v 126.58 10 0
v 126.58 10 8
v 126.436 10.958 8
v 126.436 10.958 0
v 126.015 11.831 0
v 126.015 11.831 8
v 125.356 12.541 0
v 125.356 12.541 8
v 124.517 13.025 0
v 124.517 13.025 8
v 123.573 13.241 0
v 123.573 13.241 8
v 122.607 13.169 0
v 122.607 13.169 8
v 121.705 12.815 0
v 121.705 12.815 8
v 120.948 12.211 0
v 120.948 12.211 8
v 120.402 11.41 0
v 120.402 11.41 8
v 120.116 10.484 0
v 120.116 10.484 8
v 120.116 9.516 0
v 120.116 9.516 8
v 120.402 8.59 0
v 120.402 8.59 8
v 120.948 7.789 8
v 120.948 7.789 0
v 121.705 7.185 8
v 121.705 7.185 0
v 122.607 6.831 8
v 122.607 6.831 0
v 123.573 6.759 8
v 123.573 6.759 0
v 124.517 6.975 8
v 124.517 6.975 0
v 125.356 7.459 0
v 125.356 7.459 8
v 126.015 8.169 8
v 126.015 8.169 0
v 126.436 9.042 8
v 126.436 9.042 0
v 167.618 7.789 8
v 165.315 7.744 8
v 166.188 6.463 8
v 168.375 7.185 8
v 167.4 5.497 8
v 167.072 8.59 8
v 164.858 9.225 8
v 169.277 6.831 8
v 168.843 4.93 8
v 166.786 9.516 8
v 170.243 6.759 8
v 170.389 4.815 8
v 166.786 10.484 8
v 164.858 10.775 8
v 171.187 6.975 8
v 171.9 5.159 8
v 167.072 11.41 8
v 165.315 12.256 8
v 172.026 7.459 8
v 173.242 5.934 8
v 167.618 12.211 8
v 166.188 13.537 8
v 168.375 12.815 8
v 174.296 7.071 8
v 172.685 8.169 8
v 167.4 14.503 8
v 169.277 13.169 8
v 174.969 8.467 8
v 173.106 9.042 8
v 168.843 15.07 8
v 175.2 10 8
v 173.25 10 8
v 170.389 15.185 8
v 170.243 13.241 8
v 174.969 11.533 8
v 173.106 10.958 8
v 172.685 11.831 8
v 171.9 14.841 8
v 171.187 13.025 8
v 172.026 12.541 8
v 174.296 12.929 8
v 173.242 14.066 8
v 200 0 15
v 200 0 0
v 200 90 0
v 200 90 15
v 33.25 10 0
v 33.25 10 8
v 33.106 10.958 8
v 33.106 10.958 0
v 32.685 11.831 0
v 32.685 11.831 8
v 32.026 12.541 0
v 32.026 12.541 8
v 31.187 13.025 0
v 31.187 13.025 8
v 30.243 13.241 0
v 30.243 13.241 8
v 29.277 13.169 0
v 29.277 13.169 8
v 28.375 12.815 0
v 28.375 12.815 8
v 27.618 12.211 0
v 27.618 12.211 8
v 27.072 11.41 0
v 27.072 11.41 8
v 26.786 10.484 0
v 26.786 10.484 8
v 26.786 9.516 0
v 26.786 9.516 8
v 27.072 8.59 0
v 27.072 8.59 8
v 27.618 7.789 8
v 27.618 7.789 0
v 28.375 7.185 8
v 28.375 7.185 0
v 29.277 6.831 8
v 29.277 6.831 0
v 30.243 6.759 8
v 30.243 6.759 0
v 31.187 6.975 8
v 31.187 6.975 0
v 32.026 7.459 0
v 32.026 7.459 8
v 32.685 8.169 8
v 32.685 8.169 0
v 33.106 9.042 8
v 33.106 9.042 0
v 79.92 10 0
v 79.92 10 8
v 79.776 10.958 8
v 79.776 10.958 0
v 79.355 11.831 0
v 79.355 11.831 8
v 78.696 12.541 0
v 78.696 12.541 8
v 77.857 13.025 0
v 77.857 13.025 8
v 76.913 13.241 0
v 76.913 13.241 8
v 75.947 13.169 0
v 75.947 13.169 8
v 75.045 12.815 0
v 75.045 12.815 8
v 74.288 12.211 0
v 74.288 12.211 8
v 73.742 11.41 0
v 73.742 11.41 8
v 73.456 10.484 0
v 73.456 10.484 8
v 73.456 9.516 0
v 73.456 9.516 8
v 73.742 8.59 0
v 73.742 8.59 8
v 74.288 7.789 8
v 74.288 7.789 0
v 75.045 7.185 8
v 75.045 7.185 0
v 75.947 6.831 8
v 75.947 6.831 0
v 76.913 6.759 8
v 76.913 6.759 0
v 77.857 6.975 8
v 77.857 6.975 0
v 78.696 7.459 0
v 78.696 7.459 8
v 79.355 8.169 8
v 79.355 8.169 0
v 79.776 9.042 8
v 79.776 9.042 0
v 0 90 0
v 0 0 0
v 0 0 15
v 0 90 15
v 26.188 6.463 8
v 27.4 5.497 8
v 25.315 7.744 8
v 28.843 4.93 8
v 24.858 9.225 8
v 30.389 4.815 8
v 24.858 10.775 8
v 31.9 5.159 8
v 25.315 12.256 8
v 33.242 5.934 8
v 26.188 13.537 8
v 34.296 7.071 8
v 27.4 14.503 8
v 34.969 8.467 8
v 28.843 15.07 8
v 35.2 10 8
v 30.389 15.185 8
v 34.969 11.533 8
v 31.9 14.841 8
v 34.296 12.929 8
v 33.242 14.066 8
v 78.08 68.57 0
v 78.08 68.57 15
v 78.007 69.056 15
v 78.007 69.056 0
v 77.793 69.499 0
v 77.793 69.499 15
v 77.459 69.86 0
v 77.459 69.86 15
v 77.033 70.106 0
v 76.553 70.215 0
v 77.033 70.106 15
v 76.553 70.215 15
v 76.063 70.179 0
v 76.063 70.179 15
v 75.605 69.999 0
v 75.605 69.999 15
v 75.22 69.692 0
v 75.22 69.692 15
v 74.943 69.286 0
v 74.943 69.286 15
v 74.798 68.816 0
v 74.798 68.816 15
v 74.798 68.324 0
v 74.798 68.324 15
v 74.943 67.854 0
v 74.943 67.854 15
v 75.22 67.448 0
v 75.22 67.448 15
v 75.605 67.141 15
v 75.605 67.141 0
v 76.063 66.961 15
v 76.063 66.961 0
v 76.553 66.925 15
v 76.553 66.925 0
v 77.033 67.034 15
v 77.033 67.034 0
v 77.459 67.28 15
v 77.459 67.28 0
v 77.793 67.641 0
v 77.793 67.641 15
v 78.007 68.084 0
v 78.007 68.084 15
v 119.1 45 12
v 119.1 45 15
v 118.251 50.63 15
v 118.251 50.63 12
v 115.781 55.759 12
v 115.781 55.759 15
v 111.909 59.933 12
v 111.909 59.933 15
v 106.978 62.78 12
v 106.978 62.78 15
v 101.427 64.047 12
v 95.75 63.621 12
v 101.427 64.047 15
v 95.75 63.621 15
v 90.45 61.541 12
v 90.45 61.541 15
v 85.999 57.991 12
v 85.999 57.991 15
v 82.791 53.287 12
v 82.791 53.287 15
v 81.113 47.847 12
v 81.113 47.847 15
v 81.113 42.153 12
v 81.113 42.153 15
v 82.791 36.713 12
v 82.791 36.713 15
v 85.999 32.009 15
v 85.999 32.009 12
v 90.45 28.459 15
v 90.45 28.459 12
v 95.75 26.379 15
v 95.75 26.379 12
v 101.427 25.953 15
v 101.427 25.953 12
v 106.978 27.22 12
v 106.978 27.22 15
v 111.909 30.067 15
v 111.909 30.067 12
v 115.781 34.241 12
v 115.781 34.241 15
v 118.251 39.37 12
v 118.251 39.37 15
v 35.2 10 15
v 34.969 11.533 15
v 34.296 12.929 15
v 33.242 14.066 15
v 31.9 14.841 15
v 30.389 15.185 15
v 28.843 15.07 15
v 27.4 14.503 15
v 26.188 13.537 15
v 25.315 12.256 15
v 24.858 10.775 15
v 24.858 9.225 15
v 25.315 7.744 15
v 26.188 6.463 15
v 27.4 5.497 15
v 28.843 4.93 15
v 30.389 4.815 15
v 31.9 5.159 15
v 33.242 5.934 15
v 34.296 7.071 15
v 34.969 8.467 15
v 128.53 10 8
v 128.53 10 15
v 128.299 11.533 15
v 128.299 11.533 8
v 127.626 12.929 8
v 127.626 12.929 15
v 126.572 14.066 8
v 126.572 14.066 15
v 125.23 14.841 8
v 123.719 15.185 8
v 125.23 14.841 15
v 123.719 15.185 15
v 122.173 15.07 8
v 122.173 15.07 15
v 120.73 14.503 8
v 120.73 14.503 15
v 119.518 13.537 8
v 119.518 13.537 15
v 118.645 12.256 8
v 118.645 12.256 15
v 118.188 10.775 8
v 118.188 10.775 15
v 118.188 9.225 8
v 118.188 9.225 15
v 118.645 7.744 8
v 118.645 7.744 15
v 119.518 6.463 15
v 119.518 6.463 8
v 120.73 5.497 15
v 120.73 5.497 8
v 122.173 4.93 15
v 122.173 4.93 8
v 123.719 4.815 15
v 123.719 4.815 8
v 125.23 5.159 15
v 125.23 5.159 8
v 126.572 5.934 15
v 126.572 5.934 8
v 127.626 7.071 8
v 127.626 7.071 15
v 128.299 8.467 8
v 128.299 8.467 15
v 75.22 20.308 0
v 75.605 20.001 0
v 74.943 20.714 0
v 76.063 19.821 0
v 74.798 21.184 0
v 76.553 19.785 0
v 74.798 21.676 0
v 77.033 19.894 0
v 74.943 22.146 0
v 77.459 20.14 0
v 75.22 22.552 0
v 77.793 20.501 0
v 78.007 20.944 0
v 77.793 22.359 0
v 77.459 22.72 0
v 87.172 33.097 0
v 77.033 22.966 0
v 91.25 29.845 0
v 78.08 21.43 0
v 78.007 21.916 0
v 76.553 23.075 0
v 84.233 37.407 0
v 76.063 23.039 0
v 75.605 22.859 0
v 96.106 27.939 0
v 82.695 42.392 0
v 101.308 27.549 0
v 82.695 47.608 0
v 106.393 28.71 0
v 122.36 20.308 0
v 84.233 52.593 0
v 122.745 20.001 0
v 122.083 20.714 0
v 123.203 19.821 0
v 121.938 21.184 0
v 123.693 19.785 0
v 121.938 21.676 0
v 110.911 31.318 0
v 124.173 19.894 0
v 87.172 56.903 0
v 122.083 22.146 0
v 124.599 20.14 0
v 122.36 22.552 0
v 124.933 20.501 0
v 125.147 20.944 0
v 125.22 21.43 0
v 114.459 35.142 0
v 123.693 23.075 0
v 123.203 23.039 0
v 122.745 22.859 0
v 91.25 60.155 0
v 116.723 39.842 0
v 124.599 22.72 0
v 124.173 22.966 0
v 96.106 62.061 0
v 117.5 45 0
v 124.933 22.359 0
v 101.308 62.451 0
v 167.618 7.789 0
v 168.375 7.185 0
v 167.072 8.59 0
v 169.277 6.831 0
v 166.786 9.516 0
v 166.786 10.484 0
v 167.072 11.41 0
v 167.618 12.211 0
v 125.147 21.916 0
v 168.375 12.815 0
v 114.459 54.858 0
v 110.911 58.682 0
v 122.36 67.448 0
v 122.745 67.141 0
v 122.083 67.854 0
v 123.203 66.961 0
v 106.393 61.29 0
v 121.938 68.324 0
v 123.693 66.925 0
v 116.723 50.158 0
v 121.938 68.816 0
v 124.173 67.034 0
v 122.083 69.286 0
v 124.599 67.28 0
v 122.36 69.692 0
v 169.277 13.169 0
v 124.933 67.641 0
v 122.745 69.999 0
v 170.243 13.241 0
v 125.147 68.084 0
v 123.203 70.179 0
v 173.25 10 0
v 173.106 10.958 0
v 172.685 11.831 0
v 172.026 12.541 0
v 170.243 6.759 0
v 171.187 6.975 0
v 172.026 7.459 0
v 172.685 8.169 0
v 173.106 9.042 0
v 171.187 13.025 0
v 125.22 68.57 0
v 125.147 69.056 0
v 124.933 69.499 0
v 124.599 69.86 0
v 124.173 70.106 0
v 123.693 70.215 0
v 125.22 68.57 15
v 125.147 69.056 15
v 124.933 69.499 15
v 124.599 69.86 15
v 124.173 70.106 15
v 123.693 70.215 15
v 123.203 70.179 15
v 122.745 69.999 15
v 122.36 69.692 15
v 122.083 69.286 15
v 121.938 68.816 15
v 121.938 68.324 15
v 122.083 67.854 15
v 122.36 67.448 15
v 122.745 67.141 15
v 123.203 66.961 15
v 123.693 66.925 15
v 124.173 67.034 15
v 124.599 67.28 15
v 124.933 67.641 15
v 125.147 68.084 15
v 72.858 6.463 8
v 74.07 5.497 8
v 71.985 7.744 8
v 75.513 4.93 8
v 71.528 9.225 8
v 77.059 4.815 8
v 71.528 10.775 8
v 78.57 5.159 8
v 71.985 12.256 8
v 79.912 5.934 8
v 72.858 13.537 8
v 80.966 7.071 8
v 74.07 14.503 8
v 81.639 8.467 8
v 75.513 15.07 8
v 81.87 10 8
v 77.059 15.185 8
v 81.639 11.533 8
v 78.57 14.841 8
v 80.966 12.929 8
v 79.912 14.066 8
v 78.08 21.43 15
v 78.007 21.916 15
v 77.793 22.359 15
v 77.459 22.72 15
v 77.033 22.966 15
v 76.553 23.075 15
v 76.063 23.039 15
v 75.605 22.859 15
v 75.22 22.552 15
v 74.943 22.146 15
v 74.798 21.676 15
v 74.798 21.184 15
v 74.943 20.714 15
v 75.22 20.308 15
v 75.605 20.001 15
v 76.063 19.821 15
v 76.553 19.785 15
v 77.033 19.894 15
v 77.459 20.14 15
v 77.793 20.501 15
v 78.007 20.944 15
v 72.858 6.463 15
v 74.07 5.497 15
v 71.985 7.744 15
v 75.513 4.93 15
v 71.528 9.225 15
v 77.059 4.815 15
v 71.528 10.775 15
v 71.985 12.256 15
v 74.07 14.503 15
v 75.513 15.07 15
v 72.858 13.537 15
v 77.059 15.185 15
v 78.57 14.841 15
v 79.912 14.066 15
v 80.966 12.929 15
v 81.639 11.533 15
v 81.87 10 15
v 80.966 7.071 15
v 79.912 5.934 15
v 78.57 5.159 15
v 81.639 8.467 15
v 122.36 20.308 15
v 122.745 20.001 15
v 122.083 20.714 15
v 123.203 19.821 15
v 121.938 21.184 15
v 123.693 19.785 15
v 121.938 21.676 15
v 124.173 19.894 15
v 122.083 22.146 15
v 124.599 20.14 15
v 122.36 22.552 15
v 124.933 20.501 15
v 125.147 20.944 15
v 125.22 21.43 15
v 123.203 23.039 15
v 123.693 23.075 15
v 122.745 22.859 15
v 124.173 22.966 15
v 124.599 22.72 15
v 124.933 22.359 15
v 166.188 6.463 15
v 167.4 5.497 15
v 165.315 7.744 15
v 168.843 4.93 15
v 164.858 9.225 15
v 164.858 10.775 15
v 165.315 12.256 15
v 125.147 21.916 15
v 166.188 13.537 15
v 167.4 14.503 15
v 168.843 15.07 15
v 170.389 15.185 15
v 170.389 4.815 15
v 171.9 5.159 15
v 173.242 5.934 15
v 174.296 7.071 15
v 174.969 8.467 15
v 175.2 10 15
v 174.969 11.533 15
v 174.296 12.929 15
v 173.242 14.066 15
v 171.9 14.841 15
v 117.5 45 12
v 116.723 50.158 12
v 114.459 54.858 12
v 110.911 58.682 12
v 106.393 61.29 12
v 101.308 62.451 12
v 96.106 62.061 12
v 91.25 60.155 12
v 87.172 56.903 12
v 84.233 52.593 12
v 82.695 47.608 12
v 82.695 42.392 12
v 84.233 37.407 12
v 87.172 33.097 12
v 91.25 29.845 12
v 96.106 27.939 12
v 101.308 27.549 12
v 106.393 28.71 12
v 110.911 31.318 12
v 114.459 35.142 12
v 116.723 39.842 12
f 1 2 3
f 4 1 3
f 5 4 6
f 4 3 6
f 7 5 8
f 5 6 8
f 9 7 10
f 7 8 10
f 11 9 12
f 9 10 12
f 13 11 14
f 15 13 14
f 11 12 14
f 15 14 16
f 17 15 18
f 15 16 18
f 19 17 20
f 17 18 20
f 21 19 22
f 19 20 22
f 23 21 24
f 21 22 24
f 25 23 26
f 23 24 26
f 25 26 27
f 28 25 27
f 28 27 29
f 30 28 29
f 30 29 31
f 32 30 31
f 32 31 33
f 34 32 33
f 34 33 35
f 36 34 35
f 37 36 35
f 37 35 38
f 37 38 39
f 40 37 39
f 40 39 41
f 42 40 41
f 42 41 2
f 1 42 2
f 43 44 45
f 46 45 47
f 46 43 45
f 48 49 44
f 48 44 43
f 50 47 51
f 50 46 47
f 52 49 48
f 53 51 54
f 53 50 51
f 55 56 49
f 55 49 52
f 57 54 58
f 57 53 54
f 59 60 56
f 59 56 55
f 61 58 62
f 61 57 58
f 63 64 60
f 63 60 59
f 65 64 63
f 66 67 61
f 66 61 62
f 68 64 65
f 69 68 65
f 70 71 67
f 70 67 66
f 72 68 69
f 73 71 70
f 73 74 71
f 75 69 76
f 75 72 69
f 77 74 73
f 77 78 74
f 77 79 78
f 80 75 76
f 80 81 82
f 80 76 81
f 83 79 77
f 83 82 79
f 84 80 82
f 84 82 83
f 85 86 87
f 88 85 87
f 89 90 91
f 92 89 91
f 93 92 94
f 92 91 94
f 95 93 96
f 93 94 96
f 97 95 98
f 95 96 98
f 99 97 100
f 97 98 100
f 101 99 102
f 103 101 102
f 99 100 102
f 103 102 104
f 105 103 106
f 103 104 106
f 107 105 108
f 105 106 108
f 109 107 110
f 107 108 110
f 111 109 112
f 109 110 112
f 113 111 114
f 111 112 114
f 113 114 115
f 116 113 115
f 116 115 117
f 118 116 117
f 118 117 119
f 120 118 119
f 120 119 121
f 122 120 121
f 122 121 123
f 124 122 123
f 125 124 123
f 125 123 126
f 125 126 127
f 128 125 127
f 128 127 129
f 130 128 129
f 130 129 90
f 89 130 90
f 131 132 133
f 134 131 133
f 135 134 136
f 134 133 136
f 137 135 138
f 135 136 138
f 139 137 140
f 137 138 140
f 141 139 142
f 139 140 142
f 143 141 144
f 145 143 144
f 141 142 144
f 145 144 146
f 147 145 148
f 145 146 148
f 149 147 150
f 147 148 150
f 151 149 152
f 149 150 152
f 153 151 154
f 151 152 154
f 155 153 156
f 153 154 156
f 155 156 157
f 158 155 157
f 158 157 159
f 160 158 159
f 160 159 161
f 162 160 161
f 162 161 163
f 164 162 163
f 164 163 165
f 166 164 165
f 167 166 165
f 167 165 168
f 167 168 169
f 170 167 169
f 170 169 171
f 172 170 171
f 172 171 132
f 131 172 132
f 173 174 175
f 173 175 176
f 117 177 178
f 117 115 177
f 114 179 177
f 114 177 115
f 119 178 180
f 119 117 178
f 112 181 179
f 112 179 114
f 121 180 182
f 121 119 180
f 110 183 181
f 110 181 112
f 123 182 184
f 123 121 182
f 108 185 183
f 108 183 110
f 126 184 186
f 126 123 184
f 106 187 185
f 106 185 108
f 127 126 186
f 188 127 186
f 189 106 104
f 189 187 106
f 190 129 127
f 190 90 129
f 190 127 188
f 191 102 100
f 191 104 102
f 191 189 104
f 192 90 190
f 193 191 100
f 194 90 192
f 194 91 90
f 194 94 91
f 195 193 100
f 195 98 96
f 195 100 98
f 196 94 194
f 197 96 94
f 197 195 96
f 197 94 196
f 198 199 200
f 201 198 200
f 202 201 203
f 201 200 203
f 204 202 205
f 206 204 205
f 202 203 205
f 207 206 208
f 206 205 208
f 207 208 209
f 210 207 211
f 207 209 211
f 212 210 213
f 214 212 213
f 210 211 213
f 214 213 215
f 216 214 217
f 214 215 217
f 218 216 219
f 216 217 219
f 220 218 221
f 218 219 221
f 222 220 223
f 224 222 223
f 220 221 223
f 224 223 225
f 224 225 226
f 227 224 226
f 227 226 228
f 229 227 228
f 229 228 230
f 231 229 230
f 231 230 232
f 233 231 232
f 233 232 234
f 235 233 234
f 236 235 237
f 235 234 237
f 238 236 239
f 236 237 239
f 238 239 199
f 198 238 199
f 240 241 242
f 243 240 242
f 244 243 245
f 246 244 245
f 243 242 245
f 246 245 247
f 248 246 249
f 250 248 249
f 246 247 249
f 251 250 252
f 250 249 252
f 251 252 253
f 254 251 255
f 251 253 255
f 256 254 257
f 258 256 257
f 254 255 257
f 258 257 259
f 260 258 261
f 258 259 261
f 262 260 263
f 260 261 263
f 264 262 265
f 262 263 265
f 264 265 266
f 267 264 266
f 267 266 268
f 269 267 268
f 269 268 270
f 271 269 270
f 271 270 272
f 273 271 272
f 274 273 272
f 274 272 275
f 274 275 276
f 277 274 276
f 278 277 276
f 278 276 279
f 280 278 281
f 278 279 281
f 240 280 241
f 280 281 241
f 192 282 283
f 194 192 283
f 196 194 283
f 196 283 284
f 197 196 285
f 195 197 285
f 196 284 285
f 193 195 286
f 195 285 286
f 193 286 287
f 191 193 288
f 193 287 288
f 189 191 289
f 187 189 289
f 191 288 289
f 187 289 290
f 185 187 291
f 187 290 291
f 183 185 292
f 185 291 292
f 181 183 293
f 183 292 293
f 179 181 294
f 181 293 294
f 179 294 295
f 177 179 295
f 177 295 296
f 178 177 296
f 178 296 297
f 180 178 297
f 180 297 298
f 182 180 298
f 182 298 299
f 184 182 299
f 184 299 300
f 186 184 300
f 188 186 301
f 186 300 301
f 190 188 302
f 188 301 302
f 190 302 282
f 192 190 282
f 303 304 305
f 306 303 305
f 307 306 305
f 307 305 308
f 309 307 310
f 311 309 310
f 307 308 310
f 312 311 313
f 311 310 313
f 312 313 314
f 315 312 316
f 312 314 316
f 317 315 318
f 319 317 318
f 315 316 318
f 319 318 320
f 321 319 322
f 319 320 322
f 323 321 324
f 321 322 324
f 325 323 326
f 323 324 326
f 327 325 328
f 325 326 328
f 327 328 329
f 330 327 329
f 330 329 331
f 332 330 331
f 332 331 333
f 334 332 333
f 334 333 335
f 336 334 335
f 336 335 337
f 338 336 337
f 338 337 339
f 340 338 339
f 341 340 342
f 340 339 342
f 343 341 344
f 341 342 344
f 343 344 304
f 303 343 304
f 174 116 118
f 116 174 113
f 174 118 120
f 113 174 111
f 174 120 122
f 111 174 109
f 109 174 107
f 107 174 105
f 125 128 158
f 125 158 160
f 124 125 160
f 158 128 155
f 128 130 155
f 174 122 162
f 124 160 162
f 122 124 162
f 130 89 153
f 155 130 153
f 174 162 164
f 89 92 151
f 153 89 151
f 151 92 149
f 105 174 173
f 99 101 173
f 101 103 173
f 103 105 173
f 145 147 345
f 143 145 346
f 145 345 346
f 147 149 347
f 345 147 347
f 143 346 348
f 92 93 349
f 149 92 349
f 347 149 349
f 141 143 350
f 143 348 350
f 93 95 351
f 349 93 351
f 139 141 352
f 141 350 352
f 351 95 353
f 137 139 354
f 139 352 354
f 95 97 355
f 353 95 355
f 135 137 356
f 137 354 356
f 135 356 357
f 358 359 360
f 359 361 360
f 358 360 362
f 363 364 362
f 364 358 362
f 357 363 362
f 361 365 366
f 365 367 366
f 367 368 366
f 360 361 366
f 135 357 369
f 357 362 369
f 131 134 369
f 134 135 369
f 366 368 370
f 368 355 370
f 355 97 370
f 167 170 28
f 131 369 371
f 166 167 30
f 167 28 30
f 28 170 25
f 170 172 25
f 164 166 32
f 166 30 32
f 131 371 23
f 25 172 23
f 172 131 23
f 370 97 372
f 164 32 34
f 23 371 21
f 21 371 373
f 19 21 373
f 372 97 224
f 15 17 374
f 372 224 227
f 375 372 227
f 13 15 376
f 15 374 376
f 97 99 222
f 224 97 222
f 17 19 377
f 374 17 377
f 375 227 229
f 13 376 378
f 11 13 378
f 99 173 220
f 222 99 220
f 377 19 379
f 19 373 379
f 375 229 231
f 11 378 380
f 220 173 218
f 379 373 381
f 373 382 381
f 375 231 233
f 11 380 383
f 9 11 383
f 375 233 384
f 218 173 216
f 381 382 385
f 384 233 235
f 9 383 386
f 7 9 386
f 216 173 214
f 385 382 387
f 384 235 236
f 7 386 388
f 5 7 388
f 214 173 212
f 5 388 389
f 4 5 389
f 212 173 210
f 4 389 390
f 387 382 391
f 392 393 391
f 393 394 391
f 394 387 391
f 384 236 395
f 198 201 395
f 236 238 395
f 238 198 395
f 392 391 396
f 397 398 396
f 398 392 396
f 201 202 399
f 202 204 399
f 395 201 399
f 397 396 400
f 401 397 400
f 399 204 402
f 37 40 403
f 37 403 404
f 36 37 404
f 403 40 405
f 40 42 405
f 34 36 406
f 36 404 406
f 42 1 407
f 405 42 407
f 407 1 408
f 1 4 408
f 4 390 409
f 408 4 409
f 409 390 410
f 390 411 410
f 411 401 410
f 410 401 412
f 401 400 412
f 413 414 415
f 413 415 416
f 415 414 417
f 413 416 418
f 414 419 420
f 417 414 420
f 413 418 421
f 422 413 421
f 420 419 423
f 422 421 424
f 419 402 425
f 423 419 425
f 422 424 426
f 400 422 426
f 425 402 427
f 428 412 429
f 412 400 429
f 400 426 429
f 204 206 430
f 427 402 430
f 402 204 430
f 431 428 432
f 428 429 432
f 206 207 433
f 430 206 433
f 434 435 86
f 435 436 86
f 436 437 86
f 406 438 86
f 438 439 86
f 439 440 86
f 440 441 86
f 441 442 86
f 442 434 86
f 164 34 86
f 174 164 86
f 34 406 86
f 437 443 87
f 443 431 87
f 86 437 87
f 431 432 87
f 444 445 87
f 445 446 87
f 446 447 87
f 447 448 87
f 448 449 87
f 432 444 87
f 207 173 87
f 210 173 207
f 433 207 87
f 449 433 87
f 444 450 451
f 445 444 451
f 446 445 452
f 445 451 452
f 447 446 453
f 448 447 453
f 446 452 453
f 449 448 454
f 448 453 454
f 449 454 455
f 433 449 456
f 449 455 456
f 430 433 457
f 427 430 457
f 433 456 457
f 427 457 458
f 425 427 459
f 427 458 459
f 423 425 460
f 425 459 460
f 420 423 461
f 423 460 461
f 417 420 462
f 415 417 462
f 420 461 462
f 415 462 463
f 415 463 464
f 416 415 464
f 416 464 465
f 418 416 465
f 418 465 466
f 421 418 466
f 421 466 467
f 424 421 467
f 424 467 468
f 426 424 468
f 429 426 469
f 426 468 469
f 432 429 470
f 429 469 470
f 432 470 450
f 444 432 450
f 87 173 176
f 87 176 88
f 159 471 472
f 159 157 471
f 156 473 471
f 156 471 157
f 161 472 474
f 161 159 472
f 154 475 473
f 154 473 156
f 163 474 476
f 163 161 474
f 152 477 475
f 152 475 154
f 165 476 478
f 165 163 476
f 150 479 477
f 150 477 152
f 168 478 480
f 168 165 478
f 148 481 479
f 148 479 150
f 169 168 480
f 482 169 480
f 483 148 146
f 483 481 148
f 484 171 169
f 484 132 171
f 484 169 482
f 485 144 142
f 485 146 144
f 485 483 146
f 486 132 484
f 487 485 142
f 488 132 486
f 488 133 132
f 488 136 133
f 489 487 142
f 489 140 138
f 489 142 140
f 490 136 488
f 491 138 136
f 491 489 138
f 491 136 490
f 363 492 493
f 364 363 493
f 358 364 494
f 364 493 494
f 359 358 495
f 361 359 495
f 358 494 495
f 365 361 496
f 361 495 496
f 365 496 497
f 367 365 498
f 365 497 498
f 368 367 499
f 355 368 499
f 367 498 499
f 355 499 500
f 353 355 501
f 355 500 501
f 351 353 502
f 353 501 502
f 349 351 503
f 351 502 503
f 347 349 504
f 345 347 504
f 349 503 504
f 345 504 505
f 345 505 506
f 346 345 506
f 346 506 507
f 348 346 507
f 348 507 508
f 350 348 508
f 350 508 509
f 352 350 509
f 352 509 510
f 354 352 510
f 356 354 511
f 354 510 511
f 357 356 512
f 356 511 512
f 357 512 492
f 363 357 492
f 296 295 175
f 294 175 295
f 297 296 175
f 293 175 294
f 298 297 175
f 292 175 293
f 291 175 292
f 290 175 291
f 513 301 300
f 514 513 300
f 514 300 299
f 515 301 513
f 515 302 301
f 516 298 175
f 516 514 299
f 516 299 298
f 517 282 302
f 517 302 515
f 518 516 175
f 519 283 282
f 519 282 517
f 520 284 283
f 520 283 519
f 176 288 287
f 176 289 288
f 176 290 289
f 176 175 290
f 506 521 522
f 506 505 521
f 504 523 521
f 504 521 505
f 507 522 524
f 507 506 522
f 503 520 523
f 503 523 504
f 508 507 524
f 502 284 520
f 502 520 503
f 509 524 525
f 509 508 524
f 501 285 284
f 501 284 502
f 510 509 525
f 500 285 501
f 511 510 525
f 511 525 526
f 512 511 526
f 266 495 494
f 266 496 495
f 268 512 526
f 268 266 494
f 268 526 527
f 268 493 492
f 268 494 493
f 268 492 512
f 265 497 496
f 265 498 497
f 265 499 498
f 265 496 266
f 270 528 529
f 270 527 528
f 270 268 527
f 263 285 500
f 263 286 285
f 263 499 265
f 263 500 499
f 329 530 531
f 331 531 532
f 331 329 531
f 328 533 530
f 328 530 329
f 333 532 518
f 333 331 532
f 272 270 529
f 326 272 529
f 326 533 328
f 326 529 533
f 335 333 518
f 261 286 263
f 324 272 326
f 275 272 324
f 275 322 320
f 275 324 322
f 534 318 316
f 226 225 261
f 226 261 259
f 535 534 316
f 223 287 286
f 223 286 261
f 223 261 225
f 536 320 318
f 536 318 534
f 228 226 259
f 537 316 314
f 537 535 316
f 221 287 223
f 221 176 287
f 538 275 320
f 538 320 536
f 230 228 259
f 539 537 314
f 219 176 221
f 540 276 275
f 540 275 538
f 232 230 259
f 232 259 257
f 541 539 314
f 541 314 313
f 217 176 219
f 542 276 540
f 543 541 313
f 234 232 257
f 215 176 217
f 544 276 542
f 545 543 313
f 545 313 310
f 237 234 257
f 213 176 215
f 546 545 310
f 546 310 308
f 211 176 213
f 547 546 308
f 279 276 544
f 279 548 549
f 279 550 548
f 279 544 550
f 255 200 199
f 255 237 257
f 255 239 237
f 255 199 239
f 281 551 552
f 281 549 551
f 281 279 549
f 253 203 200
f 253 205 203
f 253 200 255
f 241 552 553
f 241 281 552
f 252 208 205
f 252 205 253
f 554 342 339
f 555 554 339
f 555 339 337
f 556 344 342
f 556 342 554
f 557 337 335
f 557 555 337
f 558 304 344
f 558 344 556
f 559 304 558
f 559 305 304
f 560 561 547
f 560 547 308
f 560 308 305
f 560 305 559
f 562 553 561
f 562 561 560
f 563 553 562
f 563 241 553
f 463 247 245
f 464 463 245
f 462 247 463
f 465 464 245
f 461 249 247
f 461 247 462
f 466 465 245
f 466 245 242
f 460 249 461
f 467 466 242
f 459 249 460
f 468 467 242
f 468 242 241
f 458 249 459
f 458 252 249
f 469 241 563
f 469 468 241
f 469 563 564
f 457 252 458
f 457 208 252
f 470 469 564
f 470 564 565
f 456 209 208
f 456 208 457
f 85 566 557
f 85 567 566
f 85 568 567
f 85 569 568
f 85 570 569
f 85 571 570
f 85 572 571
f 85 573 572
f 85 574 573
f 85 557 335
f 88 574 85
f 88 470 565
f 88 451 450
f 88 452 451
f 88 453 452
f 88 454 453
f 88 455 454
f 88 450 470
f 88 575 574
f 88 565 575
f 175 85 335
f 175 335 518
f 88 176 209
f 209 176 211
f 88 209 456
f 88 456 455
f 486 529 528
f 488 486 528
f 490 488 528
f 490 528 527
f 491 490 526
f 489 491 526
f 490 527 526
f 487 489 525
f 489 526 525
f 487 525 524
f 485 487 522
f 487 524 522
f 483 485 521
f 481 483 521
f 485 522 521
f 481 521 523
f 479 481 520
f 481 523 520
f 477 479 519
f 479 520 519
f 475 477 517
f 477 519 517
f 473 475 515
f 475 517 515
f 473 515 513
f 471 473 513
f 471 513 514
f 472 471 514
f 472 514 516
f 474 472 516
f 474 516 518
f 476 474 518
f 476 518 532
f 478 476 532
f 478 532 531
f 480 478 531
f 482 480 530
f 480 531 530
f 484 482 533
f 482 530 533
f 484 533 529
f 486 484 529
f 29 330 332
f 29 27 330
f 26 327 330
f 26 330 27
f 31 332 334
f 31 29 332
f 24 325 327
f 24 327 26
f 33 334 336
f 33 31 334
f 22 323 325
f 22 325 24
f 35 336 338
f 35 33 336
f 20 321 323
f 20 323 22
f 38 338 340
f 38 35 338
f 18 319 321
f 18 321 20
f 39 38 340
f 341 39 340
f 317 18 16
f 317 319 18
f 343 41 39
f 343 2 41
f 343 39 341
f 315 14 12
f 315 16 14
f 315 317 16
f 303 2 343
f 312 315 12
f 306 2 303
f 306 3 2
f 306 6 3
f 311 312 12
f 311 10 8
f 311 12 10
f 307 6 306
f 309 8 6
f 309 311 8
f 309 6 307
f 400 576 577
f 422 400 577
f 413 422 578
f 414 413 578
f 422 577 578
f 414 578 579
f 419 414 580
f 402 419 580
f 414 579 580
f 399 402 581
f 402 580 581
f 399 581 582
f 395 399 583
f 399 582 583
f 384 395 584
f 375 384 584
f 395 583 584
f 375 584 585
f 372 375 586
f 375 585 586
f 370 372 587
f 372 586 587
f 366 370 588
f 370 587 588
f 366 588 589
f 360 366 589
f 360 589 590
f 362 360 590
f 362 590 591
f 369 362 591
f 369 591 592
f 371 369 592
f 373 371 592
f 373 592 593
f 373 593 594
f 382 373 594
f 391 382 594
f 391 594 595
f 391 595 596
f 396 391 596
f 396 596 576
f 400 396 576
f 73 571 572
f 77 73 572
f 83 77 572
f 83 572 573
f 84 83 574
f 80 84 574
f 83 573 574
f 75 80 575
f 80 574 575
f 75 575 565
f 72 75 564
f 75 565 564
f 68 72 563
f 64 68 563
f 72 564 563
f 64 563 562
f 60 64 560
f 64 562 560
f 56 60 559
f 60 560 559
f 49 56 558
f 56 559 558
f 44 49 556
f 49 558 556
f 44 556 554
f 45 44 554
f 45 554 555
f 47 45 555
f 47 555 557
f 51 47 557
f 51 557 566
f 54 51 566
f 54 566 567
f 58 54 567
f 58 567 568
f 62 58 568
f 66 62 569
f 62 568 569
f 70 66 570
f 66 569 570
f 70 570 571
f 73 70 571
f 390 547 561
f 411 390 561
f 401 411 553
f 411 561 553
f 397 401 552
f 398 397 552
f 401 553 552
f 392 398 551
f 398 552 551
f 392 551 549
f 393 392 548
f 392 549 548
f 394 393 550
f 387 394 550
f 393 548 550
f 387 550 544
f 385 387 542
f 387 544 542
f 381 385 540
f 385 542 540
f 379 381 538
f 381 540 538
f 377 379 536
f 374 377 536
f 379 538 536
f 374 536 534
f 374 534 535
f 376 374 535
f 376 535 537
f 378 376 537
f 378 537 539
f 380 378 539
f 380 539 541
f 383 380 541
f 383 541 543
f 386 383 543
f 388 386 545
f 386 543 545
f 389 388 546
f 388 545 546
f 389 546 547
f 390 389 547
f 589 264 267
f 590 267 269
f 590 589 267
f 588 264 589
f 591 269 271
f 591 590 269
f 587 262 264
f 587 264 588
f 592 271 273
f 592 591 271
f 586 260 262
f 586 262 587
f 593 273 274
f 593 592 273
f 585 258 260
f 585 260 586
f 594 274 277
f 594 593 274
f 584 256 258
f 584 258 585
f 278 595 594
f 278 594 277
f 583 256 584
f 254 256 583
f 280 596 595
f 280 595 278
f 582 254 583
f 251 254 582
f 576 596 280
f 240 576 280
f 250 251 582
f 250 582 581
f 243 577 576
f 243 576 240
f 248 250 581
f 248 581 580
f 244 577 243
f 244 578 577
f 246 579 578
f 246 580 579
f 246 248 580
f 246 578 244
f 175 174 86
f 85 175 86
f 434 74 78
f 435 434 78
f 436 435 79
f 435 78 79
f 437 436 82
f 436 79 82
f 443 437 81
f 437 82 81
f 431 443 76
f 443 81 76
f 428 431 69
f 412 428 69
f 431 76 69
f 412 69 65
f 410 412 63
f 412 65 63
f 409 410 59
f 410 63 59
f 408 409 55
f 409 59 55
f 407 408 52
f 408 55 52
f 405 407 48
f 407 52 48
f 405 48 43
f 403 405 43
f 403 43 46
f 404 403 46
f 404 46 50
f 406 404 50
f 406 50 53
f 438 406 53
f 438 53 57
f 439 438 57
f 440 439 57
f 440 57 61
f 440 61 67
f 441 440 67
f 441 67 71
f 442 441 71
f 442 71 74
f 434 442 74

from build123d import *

# Parameters (mm, degrees)
SKETCH_W        = 200
SKETCH_H        = 90
PAD_DEPTH       = 15
SKETCH001_R     = 17.5
SKETCH001_R_2   = 3.25
POCKET_DEPTH    = 15
SKETCH002_R     = 1.65
POCKET001_DEPTH = 15
SKETCH003_R     = 19.1
POCKET002_DEPTH = 3
SKETCH004_R     = 5.2
POCKET003_DEPTH = 7


with BuildPart() as part:
    # Sketch → Pad (new body)
    with BuildSketch(Plane.XY):
        with Locations((100, 45)):
            Rectangle(SKETCH_W, SKETCH_H)
    extrude(amount=PAD_DEPTH)

    # Sketch001 (on Face6 of Pad) → Pocket (cut)
    with BuildSketch(Plane.XY.offset(15)):
        with Locations((100, 45)):
            Circle(SKETCH001_R)
        with Locations((30, 10)):
            Circle(SKETCH001_R_2)
        with Locations((76.67, 10)):
            Circle(SKETCH001_R_2)
        with Locations((123.33, 10)):
            Circle(SKETCH001_R_2)
        with Locations((170, 10)):
            Circle(SKETCH001_R_2)
    extrude(amount=-POCKET_DEPTH, mode=Mode.SUBTRACT)

    # Sketch002 (on Face5 of Pocket) → Pocket001 (cut)
    with BuildSketch(Plane.XY.offset(15)):
        with Locations((76.43, 68.57)):
            Circle(SKETCH002_R)
        with Locations((123.57, 68.57)):
            Circle(SKETCH002_R)
        with Locations((76.43, 21.43)):
            Circle(SKETCH002_R)
        with Locations((123.57, 21.43)):
            Circle(SKETCH002_R)
    extrude(amount=-POCKET001_DEPTH, mode=Mode.SUBTRACT)

    # Sketch003 (on Face5 of Pocket001) → Pocket002 (cut)
    with BuildSketch(Plane.XY.offset(15)):
        with Locations((100, 45)):
            Circle(SKETCH003_R)
    extrude(amount=-POCKET002_DEPTH, mode=Mode.SUBTRACT)

    # Sketch004 (on Face5 of Pocket002) → Pocket003 (cut)
    with BuildSketch(Plane.XY.offset(15)):
        with Locations((30, 10)):
            Circle(SKETCH004_R)
        with Locations((76.67, 10)):
            Circle(SKETCH004_R)
        with Locations((123.33, 10)):
            Circle(SKETCH004_R)
        with Locations((170, 10)):
            Circle(SKETCH004_R)
    extrude(amount=-POCKET003_DEPTH, mode=Mode.SUBTRACT)


solid = part.part
